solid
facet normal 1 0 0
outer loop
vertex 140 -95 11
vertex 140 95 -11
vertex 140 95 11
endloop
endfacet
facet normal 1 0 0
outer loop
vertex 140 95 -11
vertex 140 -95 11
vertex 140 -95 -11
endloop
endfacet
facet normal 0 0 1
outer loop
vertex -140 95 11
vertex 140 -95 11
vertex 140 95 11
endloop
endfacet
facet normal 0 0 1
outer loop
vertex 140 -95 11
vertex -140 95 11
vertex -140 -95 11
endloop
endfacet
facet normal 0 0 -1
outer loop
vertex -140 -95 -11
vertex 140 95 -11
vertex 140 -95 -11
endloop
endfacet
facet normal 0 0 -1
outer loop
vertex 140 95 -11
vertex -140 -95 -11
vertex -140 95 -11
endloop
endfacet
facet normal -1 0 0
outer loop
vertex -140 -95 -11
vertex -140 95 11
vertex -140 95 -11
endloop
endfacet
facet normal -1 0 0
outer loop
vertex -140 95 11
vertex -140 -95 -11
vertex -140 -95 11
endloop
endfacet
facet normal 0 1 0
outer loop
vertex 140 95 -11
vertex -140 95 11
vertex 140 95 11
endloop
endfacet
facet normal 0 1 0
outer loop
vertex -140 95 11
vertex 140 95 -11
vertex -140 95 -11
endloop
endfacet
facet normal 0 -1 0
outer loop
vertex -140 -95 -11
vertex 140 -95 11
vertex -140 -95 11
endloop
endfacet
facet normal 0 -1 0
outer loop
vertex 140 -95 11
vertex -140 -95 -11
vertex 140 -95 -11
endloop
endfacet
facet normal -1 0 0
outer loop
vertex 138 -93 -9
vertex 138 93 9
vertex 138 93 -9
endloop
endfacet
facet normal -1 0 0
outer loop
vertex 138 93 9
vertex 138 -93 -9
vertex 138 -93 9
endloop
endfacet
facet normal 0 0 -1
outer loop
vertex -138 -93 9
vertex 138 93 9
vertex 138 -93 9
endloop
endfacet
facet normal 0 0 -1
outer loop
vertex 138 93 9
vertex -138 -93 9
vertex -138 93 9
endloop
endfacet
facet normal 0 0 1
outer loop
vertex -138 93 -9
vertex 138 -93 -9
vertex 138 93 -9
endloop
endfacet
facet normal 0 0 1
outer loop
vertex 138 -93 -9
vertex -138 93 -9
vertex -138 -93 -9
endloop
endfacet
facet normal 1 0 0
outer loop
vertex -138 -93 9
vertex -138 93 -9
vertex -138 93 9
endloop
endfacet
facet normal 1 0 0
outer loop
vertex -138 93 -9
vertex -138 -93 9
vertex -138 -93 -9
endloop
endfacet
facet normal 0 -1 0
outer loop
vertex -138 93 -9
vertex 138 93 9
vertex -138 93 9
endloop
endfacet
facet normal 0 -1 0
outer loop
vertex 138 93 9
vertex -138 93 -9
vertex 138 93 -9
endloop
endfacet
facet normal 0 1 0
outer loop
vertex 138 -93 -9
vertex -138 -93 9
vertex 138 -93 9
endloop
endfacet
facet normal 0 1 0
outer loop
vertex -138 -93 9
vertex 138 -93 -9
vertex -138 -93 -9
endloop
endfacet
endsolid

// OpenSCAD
// REPRESENTATIVE_ENCLOSURE — parameterized concept model
// Device: DS-XL Coder (ds_xl_coder)
// Status: REPRESENTATIVE_ENCLOSURE_PHYSICAL_PENDING
// Evidence class: MODELED (not MEASURED)

device_id = "ds_xl_coder";
outer_w = 280;
outer_d = 190;
outer_h = 22;
wall = 2.0;
corner_r = 4.0;
tolerance = 0.3;

module outer_shell() {
  difference() {
    cube([outer_w, outer_d, outer_h], center=true);
    cube([outer_w-2*wall, outer_d-2*wall, outer_h-2*wall], center=true);
  }
}

module interference_keepout() {
  // Battery / PCB keepouts for digital interference check
  translate([0, 0, -outer_h/4]) cube([outer_w*0.6, outer_d*0.5, outer_h*0.35], center=true);
}

outer_shell();
%interference_keepout();
